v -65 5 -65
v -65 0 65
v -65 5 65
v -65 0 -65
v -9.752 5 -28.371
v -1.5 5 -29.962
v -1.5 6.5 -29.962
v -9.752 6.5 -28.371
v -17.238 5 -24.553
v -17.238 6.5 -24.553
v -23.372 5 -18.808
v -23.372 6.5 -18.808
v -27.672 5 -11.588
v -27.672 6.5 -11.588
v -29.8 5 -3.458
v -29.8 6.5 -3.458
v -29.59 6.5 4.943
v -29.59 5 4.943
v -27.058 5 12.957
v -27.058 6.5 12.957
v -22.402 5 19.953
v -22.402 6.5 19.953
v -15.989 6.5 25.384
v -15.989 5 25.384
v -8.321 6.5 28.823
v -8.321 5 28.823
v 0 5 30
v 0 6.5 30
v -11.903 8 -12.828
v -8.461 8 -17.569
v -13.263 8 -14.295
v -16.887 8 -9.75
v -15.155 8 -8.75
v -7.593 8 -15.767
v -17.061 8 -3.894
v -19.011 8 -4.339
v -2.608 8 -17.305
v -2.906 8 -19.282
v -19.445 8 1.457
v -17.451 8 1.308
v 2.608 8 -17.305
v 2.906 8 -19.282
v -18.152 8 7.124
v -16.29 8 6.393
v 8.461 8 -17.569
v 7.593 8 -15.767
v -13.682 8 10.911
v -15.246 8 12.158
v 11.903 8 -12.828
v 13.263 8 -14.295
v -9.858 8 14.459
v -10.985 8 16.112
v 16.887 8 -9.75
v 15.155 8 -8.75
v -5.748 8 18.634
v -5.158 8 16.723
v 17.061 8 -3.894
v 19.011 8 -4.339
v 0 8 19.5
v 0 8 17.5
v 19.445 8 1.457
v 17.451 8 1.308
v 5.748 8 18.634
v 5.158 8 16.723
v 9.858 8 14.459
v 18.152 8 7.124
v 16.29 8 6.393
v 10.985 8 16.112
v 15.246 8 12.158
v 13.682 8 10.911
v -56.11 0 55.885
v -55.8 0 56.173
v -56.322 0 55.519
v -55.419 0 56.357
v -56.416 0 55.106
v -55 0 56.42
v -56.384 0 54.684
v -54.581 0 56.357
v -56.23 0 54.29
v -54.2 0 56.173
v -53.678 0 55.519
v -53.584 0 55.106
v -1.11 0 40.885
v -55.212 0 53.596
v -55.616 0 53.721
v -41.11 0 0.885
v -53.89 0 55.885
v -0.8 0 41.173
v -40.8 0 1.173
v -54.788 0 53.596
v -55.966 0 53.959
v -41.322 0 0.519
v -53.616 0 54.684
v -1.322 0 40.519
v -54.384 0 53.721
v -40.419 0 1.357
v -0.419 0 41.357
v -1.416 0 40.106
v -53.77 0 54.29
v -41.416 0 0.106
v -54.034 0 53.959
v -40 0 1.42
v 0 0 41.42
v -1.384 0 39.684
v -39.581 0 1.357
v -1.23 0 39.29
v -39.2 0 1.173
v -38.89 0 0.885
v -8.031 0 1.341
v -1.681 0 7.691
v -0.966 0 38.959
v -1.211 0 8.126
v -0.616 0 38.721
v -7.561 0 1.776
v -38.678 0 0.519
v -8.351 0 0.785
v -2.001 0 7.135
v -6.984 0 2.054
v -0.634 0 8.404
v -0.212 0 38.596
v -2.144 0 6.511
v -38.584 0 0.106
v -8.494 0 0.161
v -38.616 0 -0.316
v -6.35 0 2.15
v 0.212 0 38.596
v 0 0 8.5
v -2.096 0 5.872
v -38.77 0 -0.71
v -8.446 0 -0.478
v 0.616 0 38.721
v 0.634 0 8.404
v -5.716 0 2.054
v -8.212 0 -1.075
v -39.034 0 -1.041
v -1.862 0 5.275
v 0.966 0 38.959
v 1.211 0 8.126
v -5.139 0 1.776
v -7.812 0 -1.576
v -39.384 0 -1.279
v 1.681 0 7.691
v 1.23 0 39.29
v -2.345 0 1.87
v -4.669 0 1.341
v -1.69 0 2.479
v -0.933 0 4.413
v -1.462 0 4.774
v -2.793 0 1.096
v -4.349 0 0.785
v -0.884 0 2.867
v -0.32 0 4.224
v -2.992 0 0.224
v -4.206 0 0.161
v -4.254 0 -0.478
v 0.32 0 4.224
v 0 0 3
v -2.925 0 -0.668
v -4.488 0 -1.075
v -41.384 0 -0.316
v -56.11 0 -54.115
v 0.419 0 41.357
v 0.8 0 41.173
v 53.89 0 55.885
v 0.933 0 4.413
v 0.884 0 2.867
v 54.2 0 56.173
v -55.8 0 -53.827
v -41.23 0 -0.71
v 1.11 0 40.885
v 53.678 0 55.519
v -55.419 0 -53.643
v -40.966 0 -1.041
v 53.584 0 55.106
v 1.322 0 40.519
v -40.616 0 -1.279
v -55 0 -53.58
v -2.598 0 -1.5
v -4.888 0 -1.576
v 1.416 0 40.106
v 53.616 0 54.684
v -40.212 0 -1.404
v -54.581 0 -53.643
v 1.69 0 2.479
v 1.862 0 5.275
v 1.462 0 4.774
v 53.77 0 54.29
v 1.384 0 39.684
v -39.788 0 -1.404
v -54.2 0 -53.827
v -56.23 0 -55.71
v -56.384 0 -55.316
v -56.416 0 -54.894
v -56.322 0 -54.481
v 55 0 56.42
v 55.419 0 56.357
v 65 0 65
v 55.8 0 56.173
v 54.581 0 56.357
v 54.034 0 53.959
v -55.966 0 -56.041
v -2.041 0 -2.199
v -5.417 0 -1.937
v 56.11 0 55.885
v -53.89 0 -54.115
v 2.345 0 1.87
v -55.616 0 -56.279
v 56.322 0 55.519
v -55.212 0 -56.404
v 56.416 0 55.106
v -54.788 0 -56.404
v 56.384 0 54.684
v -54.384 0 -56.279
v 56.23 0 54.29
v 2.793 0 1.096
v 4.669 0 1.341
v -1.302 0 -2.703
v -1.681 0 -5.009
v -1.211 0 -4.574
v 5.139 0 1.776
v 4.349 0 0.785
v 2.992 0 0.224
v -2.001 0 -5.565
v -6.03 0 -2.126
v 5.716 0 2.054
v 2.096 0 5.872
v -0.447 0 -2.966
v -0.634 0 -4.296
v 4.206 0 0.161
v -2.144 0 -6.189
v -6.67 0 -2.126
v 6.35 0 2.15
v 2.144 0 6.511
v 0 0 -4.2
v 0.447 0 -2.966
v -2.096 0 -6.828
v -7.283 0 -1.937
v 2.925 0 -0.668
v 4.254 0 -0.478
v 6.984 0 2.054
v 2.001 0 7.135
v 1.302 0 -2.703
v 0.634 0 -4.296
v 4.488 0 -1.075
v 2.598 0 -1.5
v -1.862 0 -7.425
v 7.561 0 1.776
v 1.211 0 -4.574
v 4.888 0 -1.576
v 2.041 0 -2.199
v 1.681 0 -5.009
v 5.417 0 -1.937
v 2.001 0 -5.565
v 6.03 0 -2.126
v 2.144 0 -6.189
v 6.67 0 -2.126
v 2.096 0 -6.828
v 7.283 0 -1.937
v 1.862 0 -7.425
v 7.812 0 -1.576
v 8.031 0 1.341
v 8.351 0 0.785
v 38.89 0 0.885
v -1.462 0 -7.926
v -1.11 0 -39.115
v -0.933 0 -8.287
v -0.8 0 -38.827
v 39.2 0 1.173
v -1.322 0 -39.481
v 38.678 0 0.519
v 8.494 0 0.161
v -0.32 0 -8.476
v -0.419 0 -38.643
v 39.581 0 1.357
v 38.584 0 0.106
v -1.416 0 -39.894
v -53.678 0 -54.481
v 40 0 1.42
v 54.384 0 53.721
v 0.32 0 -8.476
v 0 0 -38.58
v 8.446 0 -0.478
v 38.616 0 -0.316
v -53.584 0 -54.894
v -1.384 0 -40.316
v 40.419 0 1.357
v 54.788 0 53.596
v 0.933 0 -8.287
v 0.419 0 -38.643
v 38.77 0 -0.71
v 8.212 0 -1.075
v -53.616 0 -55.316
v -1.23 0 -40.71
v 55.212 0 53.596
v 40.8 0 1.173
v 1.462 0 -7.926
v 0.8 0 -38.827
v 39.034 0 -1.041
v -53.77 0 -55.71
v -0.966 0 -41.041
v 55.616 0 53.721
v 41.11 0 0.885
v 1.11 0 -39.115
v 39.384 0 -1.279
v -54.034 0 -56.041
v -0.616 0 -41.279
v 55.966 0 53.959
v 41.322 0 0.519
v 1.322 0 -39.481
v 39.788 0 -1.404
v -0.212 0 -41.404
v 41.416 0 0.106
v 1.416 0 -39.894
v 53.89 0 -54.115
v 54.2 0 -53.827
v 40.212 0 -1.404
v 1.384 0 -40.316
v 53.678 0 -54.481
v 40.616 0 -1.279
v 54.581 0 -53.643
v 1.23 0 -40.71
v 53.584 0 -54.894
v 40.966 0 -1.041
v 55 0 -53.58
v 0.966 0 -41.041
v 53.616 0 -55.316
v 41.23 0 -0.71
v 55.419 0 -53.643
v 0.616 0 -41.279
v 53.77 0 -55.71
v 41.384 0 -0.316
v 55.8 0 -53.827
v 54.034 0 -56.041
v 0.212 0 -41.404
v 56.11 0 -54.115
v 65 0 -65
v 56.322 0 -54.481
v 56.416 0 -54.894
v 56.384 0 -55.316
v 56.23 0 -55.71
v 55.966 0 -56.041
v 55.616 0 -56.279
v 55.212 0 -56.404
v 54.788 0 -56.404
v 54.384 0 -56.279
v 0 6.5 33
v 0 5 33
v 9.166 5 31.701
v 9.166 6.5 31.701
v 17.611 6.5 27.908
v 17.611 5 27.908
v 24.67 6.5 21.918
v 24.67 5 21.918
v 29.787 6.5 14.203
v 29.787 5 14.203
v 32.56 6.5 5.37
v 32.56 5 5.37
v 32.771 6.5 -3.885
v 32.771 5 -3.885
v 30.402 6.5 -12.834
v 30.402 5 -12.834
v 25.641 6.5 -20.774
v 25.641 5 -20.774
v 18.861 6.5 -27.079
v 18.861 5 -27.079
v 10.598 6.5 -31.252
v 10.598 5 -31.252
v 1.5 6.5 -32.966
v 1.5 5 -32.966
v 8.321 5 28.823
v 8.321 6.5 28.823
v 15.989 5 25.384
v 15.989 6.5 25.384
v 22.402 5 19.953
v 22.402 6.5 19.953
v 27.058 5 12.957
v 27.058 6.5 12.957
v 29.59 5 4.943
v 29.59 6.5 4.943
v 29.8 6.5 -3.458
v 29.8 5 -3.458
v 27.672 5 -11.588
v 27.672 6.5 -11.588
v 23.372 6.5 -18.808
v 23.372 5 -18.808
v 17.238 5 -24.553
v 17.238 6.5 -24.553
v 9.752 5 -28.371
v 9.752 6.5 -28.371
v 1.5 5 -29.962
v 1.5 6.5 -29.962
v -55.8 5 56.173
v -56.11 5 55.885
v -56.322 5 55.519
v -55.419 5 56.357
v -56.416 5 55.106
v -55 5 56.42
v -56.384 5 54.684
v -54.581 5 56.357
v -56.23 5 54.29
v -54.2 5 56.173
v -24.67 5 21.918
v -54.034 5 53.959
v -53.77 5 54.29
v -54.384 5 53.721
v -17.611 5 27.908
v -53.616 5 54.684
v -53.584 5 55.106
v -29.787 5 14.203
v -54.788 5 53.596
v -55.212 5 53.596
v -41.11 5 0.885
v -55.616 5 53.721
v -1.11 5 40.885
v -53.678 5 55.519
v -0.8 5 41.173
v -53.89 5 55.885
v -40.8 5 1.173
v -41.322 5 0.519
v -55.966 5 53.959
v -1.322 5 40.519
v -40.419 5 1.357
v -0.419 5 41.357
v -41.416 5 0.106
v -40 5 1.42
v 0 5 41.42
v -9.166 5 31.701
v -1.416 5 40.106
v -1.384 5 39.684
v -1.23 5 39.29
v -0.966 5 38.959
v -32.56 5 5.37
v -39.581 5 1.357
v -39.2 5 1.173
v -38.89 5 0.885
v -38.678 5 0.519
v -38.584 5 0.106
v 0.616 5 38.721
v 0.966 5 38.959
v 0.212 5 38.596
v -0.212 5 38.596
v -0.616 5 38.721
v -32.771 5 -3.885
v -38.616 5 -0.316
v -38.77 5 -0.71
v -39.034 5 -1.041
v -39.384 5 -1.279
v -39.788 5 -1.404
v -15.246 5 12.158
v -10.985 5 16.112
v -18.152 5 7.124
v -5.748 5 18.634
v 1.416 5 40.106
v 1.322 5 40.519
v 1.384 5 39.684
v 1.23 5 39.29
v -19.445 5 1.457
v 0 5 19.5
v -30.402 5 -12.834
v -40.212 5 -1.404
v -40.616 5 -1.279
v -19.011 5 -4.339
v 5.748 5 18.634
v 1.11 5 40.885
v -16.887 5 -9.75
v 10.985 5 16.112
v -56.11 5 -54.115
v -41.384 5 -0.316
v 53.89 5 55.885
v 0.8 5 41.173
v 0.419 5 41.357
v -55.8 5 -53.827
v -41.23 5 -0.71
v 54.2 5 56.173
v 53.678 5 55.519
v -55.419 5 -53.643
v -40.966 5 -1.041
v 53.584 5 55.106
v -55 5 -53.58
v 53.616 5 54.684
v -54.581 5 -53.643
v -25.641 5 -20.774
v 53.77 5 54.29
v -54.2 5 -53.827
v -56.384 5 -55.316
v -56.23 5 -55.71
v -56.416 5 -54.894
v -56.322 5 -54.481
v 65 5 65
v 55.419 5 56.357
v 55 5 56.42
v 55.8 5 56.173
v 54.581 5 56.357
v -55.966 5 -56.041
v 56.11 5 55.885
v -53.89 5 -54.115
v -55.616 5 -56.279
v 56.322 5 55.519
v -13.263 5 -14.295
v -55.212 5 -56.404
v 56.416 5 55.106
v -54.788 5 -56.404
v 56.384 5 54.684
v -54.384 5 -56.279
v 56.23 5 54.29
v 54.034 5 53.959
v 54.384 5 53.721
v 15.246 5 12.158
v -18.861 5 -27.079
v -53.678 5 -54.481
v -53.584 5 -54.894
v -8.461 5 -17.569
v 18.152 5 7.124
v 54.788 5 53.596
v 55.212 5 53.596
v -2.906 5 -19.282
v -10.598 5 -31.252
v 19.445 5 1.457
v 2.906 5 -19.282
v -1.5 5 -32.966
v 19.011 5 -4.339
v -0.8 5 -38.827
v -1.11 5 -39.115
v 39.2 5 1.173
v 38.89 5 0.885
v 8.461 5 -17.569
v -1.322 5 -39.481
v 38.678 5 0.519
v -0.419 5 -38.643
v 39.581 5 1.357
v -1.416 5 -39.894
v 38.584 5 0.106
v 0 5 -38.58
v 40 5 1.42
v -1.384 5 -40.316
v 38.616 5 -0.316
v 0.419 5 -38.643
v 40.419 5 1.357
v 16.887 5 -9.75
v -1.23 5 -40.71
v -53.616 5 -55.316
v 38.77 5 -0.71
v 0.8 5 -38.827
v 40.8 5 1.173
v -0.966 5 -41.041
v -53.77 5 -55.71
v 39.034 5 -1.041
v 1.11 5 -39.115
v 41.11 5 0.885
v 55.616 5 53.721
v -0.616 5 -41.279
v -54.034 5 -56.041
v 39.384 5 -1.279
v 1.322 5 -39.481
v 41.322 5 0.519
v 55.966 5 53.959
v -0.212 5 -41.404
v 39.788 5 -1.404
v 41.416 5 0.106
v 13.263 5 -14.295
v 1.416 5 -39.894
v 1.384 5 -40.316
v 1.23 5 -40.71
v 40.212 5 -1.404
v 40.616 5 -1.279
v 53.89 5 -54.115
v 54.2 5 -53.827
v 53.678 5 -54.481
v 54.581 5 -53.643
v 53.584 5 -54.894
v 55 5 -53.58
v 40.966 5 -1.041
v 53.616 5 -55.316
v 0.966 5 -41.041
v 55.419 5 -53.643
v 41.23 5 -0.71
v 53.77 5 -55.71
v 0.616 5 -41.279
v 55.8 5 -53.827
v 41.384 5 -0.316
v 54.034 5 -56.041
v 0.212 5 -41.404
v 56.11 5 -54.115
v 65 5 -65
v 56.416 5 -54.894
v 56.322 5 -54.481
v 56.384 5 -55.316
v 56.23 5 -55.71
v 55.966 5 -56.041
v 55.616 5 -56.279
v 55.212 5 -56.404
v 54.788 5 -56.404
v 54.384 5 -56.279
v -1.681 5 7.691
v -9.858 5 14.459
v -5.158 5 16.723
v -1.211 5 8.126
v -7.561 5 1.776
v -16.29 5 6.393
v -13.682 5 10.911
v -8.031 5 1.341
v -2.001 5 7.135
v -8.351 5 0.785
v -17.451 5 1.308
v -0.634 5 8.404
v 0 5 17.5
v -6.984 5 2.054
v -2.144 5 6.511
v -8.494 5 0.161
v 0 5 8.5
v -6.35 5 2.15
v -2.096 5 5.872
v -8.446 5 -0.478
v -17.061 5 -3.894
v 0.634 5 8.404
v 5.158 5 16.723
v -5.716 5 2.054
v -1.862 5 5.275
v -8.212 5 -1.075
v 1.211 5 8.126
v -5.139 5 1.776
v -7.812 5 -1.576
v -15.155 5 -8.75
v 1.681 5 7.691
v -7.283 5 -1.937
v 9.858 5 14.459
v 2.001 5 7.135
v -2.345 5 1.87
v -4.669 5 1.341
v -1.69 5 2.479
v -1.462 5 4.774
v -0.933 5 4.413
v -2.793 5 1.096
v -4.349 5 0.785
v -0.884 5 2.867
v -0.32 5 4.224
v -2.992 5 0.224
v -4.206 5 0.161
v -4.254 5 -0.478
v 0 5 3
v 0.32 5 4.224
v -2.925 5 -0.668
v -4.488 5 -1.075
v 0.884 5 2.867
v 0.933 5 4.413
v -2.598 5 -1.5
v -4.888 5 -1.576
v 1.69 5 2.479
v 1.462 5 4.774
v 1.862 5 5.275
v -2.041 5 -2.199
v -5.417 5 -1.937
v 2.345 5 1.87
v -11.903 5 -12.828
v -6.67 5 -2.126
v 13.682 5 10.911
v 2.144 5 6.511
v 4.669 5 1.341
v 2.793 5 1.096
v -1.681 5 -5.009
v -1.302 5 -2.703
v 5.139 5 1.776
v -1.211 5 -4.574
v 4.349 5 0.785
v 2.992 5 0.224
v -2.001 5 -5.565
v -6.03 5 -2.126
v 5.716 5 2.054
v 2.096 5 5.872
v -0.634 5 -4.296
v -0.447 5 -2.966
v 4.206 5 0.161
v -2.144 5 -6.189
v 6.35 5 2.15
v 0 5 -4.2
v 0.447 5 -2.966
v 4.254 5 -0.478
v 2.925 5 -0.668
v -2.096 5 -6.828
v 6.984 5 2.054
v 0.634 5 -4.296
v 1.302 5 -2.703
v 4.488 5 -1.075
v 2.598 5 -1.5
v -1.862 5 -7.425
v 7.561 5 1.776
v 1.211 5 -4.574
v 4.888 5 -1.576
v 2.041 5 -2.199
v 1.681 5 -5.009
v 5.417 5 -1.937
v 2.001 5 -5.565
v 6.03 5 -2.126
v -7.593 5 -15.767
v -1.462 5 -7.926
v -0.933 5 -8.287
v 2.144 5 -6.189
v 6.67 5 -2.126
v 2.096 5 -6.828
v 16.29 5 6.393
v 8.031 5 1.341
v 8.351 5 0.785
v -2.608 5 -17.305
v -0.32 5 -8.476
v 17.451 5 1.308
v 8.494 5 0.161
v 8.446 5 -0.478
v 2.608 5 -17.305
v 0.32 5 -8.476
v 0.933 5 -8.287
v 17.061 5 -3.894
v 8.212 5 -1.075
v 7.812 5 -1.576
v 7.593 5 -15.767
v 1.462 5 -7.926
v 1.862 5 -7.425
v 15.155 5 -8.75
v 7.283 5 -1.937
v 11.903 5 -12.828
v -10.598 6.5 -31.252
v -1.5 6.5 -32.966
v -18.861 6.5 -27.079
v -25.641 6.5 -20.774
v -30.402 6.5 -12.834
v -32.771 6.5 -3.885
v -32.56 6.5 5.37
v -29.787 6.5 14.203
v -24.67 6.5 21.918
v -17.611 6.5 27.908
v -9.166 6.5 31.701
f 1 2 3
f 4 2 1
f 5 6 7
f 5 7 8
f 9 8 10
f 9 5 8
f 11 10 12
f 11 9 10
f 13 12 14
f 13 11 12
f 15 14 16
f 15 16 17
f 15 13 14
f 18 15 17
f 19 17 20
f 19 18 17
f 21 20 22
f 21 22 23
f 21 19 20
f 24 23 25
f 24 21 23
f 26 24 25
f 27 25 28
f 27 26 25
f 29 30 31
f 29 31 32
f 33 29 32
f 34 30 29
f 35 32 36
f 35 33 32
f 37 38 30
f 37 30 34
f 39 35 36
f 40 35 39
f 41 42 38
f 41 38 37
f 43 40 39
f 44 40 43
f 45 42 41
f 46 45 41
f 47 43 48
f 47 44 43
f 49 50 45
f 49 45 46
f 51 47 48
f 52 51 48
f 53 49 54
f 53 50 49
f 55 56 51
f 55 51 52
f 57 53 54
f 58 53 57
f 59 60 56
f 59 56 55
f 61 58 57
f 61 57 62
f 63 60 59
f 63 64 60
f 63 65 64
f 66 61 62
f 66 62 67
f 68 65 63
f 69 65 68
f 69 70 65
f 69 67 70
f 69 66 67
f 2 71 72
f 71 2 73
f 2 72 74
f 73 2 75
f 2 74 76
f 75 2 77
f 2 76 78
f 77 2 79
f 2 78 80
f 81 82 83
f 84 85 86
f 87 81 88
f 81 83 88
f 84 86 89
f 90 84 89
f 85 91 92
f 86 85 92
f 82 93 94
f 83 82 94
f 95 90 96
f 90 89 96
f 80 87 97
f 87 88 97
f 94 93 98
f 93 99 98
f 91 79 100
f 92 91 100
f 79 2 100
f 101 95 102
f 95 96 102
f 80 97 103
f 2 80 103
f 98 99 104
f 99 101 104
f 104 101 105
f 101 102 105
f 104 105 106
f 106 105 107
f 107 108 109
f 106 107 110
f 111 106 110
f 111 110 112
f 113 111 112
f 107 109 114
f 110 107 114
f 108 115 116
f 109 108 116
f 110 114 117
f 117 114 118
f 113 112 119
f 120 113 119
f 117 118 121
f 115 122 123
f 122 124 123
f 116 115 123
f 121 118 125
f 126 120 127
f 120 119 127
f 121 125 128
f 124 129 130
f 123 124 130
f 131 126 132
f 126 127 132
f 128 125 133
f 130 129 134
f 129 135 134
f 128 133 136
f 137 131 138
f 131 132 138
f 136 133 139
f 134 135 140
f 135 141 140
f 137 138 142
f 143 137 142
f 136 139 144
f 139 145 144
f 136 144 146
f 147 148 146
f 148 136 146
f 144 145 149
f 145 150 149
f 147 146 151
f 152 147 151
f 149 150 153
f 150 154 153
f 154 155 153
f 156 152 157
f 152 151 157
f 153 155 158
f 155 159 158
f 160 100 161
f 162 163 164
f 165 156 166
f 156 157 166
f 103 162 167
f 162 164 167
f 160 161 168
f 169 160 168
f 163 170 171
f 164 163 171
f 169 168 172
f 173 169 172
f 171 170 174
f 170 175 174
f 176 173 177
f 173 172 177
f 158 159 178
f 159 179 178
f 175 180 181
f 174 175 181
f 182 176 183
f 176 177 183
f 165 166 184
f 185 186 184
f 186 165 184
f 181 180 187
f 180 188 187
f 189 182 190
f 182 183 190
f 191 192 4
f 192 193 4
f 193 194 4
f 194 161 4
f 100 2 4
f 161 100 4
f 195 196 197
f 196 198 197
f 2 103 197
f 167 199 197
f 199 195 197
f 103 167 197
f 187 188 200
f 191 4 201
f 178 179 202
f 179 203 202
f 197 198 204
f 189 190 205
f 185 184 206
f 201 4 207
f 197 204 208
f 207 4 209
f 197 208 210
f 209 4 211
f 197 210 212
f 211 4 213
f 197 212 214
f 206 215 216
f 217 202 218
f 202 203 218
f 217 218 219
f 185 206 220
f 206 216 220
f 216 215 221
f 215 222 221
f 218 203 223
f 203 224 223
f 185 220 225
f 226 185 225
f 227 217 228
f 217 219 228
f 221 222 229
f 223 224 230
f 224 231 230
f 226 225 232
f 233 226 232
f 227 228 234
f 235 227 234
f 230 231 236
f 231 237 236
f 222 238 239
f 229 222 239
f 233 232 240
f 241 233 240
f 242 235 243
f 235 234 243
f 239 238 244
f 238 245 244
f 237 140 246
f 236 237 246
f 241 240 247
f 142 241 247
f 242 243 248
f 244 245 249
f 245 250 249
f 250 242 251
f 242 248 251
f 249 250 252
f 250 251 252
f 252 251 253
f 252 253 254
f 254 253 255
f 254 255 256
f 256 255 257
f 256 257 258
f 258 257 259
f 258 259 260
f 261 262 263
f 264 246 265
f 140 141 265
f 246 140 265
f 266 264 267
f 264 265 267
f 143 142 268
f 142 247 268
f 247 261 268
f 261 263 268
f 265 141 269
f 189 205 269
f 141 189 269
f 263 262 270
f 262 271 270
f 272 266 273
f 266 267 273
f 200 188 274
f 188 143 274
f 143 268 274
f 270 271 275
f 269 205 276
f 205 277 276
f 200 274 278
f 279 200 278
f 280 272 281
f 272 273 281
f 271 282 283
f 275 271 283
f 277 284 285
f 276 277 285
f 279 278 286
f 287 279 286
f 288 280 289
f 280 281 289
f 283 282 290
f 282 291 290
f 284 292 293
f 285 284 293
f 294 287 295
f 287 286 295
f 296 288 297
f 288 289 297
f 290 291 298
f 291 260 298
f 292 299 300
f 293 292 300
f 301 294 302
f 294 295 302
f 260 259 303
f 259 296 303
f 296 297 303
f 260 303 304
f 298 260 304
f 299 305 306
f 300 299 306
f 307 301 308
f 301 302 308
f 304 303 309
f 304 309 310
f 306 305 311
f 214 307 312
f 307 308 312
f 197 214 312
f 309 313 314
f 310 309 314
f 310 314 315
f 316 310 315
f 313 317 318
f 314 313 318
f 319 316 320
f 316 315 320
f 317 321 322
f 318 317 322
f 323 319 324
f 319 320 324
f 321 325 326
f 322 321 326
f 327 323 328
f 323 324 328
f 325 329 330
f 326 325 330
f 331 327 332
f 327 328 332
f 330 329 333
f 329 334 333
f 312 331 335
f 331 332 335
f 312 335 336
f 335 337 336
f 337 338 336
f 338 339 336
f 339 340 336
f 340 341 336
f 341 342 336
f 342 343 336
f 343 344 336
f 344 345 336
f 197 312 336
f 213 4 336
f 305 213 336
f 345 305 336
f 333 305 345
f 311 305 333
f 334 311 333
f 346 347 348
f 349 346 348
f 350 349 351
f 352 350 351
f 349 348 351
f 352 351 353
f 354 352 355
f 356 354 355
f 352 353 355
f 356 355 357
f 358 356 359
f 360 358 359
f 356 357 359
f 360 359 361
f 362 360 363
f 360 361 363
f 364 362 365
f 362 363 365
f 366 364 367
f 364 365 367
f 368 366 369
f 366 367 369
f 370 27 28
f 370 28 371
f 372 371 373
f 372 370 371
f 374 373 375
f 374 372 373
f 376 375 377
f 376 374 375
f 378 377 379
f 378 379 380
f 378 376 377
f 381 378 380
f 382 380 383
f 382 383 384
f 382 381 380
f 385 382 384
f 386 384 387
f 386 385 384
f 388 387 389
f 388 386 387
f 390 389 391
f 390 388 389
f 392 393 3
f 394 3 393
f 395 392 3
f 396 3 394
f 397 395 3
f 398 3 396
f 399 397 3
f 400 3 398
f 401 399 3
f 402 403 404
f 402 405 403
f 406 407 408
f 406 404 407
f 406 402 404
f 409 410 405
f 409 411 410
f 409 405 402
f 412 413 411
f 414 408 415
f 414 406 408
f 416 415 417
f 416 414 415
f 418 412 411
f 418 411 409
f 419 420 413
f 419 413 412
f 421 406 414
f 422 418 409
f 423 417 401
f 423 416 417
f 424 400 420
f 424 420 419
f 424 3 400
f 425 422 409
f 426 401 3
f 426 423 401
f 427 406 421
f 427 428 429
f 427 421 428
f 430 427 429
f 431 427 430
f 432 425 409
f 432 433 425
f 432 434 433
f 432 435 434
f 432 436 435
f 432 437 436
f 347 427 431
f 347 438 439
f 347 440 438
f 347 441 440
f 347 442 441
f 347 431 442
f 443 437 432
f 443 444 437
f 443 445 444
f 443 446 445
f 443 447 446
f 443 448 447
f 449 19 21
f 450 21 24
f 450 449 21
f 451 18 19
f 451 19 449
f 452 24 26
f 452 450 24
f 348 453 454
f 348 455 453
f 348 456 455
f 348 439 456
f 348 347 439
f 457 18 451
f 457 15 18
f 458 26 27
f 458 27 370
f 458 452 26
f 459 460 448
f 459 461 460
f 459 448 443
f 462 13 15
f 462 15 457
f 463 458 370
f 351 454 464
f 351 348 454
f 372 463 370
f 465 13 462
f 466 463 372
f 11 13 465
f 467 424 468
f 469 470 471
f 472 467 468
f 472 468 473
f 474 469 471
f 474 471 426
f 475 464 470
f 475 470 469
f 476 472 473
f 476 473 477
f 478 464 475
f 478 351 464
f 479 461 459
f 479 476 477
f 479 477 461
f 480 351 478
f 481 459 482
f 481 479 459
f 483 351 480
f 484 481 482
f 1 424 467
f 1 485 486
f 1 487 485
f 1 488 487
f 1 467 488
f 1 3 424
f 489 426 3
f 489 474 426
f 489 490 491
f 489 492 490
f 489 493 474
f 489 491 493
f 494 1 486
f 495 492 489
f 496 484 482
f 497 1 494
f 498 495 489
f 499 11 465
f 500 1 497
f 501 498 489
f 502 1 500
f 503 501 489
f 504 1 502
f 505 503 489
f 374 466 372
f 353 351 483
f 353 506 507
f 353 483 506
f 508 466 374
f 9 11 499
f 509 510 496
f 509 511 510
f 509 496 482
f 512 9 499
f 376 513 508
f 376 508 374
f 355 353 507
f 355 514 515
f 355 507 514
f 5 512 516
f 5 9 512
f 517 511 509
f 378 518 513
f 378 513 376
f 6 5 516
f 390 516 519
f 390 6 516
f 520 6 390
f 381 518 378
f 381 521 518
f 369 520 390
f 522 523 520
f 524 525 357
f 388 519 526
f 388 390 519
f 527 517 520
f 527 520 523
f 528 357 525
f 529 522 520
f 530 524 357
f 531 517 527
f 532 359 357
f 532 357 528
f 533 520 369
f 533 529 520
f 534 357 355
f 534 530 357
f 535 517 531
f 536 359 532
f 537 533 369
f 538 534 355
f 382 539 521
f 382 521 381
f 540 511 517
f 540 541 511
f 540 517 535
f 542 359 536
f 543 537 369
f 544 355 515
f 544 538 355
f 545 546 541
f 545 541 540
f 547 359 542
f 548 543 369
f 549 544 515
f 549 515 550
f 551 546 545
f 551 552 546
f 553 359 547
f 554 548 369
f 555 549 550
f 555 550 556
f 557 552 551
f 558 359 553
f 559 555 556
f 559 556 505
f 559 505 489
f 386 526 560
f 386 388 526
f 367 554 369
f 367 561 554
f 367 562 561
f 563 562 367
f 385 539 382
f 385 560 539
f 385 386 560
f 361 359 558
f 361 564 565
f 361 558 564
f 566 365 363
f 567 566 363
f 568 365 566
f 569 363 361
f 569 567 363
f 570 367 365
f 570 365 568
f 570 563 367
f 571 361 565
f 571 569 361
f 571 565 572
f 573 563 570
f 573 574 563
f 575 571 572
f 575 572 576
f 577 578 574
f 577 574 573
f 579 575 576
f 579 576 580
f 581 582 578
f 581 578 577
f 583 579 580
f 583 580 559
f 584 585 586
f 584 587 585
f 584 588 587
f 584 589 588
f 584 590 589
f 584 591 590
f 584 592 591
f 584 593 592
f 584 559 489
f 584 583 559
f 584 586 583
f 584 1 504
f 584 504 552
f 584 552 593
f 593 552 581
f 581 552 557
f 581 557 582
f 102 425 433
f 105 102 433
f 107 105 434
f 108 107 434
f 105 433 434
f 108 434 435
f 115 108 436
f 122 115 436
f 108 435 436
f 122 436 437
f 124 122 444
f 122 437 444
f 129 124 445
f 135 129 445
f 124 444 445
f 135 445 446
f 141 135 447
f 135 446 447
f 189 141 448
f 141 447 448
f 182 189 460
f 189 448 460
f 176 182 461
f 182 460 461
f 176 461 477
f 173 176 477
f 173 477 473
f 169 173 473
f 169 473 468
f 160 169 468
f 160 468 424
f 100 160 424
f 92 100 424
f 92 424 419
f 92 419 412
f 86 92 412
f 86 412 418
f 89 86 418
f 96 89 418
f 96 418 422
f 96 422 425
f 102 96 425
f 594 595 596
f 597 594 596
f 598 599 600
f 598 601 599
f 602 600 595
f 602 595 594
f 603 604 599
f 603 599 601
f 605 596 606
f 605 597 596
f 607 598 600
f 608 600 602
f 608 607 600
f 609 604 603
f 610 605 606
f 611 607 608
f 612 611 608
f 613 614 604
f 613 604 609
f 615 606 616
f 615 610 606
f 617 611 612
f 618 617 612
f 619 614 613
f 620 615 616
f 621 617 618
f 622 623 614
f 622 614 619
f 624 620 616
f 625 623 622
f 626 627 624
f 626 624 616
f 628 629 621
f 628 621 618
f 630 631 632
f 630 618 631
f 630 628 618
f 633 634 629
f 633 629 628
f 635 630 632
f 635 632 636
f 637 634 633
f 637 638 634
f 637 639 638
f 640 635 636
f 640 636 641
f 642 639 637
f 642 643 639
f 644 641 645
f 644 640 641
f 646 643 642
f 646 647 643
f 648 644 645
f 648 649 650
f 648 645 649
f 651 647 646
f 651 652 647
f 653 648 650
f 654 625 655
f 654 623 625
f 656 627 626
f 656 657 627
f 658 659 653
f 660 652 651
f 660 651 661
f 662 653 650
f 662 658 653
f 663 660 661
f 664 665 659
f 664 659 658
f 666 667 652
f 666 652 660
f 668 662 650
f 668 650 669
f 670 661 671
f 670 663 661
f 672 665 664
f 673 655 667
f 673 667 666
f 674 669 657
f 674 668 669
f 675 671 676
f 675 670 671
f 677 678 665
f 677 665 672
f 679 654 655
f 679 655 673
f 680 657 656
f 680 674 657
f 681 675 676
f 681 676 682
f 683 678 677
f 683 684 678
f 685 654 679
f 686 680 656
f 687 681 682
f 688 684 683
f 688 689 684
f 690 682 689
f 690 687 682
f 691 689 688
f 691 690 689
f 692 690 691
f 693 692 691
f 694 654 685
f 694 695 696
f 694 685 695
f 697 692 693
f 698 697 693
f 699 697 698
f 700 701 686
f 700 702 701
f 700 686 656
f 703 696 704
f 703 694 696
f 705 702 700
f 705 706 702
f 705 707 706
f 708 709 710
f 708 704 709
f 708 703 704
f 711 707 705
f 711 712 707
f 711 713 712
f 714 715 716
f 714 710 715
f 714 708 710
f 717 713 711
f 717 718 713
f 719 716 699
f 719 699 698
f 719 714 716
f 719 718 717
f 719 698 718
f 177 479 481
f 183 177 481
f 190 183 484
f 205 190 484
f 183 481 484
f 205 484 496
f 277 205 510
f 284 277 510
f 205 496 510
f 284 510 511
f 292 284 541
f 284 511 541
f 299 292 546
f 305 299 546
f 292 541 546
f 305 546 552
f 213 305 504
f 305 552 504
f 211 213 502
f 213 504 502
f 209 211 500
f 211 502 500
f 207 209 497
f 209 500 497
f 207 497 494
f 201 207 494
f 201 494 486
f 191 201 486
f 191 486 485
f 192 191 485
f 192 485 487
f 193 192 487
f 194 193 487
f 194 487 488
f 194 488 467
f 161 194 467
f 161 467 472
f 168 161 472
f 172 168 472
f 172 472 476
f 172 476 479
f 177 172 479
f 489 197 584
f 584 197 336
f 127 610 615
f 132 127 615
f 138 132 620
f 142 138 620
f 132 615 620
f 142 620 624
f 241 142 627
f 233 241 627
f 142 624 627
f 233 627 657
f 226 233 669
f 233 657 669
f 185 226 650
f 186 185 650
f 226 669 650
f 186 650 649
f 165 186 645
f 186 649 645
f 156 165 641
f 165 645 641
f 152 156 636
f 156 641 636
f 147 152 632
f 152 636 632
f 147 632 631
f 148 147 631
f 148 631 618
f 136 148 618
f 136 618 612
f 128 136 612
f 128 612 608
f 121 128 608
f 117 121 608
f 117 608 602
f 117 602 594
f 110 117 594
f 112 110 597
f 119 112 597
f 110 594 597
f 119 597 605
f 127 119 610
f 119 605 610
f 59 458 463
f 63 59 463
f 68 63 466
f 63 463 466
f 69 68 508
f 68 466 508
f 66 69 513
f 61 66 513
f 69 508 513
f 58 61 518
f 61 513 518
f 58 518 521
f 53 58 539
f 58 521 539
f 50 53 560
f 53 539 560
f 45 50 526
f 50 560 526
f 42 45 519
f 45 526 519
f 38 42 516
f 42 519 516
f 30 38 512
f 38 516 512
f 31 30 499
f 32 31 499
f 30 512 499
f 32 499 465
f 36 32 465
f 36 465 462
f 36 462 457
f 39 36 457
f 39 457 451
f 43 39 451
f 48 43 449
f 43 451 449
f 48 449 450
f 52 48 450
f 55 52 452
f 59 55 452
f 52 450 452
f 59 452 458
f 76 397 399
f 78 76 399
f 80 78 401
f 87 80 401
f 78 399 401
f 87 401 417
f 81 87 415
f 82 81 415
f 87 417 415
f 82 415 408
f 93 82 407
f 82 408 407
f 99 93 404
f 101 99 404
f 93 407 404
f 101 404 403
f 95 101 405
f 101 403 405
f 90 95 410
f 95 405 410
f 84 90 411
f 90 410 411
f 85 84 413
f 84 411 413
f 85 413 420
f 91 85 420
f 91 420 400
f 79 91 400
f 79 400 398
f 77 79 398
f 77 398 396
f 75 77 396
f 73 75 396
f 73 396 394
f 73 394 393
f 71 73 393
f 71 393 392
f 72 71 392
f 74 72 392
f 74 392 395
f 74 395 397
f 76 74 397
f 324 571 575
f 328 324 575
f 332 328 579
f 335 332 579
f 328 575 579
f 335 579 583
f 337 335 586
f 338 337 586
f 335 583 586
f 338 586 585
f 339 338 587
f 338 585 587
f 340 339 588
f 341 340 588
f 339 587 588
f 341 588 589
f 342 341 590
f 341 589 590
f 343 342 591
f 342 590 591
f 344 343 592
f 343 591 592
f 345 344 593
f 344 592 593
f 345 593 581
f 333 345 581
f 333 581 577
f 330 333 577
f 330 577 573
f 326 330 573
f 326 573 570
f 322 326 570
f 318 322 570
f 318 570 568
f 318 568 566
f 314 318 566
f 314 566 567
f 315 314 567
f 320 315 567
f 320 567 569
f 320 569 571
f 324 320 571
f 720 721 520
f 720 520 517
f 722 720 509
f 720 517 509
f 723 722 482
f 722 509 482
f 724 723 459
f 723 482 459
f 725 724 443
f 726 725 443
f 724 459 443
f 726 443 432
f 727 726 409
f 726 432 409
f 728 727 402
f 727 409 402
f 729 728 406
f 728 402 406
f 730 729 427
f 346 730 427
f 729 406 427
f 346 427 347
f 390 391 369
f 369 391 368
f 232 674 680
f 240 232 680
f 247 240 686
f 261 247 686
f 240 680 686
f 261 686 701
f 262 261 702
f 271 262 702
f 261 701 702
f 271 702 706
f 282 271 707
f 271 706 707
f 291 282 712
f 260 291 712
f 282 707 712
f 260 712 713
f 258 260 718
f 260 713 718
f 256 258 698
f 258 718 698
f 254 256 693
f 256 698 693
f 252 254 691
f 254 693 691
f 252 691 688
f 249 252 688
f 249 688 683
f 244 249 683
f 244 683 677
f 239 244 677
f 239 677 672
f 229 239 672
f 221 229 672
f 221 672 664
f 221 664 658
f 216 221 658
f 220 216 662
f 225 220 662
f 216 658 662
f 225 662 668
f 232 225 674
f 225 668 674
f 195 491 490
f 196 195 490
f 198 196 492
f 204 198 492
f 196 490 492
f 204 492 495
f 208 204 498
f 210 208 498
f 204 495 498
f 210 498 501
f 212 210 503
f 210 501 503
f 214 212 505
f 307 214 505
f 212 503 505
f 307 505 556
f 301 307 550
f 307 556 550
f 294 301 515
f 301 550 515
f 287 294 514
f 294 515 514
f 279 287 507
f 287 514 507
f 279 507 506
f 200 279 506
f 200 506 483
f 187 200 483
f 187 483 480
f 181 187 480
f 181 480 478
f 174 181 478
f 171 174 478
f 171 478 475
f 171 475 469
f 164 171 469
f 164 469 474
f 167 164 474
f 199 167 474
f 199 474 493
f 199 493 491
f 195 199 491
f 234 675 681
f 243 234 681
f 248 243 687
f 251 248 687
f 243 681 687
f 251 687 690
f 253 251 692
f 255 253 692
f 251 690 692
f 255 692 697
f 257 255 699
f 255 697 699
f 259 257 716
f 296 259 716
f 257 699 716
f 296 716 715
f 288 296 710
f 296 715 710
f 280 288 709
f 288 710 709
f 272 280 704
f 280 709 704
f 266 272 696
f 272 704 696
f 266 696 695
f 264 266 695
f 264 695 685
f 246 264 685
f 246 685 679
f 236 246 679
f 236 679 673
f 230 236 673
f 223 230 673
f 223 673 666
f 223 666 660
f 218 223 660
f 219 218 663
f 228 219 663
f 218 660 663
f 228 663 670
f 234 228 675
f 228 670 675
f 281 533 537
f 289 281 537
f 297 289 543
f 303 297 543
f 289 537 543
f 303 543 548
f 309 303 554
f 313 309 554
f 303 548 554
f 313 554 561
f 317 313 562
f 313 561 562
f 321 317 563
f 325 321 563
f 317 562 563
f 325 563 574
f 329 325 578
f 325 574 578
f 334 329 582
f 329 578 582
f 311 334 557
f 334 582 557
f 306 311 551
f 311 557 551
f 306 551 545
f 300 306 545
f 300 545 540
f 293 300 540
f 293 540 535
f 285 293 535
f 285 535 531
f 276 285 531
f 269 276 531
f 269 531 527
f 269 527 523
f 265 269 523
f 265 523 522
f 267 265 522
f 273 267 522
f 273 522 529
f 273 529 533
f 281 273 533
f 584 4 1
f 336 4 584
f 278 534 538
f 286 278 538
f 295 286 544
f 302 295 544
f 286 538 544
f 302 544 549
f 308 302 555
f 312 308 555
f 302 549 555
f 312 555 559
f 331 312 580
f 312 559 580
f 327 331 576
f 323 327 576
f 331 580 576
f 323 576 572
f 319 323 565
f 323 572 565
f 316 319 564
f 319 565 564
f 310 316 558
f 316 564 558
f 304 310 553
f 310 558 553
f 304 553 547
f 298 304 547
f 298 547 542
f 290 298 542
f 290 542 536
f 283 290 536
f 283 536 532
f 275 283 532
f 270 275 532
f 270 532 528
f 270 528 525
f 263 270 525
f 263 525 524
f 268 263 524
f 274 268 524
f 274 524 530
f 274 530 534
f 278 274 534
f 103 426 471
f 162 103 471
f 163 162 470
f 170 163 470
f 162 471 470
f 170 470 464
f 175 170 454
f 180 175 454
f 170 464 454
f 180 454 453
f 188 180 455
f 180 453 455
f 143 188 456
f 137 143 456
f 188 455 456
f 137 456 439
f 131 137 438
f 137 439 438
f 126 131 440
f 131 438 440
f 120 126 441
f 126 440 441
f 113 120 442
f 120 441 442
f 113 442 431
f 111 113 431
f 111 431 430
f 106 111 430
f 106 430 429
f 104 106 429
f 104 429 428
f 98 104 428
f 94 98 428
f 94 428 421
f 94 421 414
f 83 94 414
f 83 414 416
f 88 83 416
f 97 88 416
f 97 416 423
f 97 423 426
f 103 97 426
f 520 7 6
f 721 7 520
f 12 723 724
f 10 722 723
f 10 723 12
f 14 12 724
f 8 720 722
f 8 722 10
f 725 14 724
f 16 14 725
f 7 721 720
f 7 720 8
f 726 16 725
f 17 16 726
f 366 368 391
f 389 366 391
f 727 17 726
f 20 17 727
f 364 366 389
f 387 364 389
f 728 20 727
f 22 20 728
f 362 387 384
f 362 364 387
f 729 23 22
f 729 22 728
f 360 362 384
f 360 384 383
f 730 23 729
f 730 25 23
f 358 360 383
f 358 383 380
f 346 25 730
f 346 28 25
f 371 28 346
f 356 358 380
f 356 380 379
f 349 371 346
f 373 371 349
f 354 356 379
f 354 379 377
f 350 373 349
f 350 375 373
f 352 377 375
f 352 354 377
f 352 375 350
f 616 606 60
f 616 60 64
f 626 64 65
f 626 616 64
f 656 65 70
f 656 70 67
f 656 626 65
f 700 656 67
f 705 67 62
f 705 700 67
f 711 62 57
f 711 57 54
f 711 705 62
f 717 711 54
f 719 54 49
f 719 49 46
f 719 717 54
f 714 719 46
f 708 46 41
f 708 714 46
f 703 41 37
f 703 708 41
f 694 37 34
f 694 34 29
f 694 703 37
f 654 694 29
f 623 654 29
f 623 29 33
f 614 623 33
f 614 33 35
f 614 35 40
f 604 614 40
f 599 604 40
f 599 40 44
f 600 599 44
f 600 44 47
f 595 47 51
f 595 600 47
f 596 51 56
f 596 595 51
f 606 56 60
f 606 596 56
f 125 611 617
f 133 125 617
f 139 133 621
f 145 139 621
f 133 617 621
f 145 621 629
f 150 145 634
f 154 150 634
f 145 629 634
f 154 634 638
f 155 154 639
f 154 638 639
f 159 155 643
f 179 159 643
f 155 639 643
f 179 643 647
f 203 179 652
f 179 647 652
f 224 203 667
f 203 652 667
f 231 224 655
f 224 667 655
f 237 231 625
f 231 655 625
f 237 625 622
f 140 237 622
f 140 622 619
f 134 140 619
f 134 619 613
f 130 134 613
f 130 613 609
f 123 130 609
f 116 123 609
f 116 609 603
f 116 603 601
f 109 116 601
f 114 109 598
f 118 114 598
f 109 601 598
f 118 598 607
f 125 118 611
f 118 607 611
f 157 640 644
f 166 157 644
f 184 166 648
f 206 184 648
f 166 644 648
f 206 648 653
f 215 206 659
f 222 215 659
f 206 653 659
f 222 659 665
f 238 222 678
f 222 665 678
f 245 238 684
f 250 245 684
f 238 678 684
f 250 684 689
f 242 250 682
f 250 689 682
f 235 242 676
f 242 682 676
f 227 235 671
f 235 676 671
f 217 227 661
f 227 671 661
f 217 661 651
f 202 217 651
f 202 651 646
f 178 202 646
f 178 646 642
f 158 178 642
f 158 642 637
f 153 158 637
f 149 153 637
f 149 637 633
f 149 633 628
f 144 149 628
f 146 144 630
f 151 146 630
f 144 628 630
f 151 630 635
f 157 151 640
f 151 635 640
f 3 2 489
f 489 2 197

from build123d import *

# Parameters (mm, degrees)
SKETCH1_W           = 130
SKETCH1_H           = 130
SKETCH1_R           = 31
SKETCH1_R_2         = 26
SKETCH1_R_3         = 24
BOSS_EXTRUDE2_DEPTH = 5
SKETCH2_R           = 33
SKETCH2_R_2         = 30
BOSS_EXTRUDE3_DEPTH = 1.5
SKETCH3_R           = 2.15
SKETCH3_R_2         = 3
CUT_EXTRUDE1_DEPTH  = 5
SKETCH5_R           = 1.42
CUT_EXTRUDE3_DEPTH  = 10
SKETCH6_R           = 19.5
SKETCH6_R_2         = 17.5
BOSS_EXTRUDE4_DEPTH = 3
SKETCH7_W           = 3
SKETCH7_H           = 7.819809603
CUT_EXTRUDE5_DEPTH  = 1.5


with BuildPart() as part:
    # Sketch1 → Boss-Extrude2 (new body)
    # profile 1 of 4: a face of its own
    with BuildSketch(Plane(origin=(0, 0, 0), x_dir=(1, 0, 0), z_dir=(0, 1, 0))):
        Rectangle(SKETCH1_W, SKETCH1_H)
        Circle(SKETCH1_R, mode=Mode.SUBTRACT)
    # profile 2 of 4: a face of its own
    with BuildSketch(Plane(origin=(0, 0, 0), x_dir=(1, 0, 0), z_dir=(0, 1, 0))):
        Circle(SKETCH1_R)
        Circle(SKETCH1_R_2, mode=Mode.SUBTRACT)
    # profile 3 of 4: a face of its own
    with BuildSketch(Plane(origin=(0, 0, 0), x_dir=(1, 0, 0), z_dir=(0, 1, 0))):
        Circle(SKETCH1_R_2)
        Circle(SKETCH1_R_3, mode=Mode.SUBTRACT)
    # profile 4 of 4: a face of its own
    with BuildSketch(Plane(origin=(0, 0, 0), x_dir=(1, 0, 0), z_dir=(0, 1, 0))):
        Circle(SKETCH1_R_3)
    extrude(amount=BOSS_EXTRUDE2_DEPTH)

    # Sketch2 → Boss-Extrude3 (add)
    with BuildSketch(Plane(origin=(0, 5, 0), x_dir=(1, 0, 0), z_dir=(0, 1, 0))):
        with Locations(Location((0, 0, 0), (0, 0, 270))):
            Circle(SKETCH2_R)
        with Locations(Location((0, 0, 0), (0, 0, 270))):
            Circle(SKETCH2_R_2, mode=Mode.SUBTRACT)
    extrude(amount=BOSS_EXTRUDE3_DEPTH)

    # Sketch3 → Cut-Extrude1 (cut)
    with BuildSketch(Plane(origin=(0, 5, 0), x_dir=(1, 0, 0), z_dir=(0, 1, 0))):
        with Locations(Location((0, 6.35, 0), (0, 0, 270))):
            Circle(SKETCH3_R)
        with Locations(Location((6.35, 0, 0), (0, 0, 270))):
            Circle(SKETCH3_R)
        with Locations(Location((0, -6.35, 0), (0, 0, 270))):
            Circle(SKETCH3_R)
        with Locations(Location((-6.35, 0, 0), (0, 0, 270))):
            Circle(SKETCH3_R)
        with Locations(Location((0, 0, 0), (0, 0, 270))):
            Circle(SKETCH3_R_2)
    extrude(amount=-CUT_EXTRUDE1_DEPTH, mode=Mode.SUBTRACT)

    # Sketch5 → Cut-Extrude3 (cut)
    with BuildSketch(Plane(origin=(0, 5, 0), x_dir=(1, 0, 0), z_dir=(0, 1, 0))):
        with Locations(Location((-55, 55, 0), (0, 0, 270))):
            Circle(SKETCH5_R)
        with Locations(Location((-55, -55, 0), (0, 0, 270))):
            Circle(SKETCH5_R)
        with Locations(Location((55, -55, 0), (0, 0, 270))):
            Circle(SKETCH5_R)
        with Locations(Location((55, 55, 0), (0, 0, 270))):
            Circle(SKETCH5_R)
        with Locations(Location((0, 40, 0), (0, 0, 270))):
            Circle(SKETCH5_R)
        with Locations(Location((-40, 0, 0), (0, 0, 270))):
            Circle(SKETCH5_R)
        with Locations(Location((40, 0, 0), (0, 0, 270))):
            Circle(SKETCH5_R)
        with Locations(Location((0, -40, 0), (0, 0, 270))):
            Circle(SKETCH5_R)
    extrude(amount=-CUT_EXTRUDE3_DEPTH, mode=Mode.SUBTRACT)

    # Sketch6 → Boss-Extrude4 (add)
    with BuildSketch(Plane(origin=(0, 5, 0), x_dir=(1, 0, 0), z_dir=(0, 1, 0))):
        with Locations(Location((0, 0, 0), (0, 0, 270))):
            Circle(SKETCH6_R)
        with Locations(Location((0, 0, 0), (0, 0, 270))):
            Circle(SKETCH6_R_2, mode=Mode.SUBTRACT)
    extrude(amount=BOSS_EXTRUDE4_DEPTH)

    # Sketch7 → Cut-Extrude5 (cut)
    with BuildSketch(Plane(origin=(0, 6.5, 0), x_dir=(1, 0, 0), z_dir=(0, 1, 0))):
        with Locations((0, 31.405364374)):
            Rectangle(SKETCH7_W, SKETCH7_H)
    extrude(amount=-CUT_EXTRUDE5_DEPTH, mode=Mode.SUBTRACT)


solid = part.part
